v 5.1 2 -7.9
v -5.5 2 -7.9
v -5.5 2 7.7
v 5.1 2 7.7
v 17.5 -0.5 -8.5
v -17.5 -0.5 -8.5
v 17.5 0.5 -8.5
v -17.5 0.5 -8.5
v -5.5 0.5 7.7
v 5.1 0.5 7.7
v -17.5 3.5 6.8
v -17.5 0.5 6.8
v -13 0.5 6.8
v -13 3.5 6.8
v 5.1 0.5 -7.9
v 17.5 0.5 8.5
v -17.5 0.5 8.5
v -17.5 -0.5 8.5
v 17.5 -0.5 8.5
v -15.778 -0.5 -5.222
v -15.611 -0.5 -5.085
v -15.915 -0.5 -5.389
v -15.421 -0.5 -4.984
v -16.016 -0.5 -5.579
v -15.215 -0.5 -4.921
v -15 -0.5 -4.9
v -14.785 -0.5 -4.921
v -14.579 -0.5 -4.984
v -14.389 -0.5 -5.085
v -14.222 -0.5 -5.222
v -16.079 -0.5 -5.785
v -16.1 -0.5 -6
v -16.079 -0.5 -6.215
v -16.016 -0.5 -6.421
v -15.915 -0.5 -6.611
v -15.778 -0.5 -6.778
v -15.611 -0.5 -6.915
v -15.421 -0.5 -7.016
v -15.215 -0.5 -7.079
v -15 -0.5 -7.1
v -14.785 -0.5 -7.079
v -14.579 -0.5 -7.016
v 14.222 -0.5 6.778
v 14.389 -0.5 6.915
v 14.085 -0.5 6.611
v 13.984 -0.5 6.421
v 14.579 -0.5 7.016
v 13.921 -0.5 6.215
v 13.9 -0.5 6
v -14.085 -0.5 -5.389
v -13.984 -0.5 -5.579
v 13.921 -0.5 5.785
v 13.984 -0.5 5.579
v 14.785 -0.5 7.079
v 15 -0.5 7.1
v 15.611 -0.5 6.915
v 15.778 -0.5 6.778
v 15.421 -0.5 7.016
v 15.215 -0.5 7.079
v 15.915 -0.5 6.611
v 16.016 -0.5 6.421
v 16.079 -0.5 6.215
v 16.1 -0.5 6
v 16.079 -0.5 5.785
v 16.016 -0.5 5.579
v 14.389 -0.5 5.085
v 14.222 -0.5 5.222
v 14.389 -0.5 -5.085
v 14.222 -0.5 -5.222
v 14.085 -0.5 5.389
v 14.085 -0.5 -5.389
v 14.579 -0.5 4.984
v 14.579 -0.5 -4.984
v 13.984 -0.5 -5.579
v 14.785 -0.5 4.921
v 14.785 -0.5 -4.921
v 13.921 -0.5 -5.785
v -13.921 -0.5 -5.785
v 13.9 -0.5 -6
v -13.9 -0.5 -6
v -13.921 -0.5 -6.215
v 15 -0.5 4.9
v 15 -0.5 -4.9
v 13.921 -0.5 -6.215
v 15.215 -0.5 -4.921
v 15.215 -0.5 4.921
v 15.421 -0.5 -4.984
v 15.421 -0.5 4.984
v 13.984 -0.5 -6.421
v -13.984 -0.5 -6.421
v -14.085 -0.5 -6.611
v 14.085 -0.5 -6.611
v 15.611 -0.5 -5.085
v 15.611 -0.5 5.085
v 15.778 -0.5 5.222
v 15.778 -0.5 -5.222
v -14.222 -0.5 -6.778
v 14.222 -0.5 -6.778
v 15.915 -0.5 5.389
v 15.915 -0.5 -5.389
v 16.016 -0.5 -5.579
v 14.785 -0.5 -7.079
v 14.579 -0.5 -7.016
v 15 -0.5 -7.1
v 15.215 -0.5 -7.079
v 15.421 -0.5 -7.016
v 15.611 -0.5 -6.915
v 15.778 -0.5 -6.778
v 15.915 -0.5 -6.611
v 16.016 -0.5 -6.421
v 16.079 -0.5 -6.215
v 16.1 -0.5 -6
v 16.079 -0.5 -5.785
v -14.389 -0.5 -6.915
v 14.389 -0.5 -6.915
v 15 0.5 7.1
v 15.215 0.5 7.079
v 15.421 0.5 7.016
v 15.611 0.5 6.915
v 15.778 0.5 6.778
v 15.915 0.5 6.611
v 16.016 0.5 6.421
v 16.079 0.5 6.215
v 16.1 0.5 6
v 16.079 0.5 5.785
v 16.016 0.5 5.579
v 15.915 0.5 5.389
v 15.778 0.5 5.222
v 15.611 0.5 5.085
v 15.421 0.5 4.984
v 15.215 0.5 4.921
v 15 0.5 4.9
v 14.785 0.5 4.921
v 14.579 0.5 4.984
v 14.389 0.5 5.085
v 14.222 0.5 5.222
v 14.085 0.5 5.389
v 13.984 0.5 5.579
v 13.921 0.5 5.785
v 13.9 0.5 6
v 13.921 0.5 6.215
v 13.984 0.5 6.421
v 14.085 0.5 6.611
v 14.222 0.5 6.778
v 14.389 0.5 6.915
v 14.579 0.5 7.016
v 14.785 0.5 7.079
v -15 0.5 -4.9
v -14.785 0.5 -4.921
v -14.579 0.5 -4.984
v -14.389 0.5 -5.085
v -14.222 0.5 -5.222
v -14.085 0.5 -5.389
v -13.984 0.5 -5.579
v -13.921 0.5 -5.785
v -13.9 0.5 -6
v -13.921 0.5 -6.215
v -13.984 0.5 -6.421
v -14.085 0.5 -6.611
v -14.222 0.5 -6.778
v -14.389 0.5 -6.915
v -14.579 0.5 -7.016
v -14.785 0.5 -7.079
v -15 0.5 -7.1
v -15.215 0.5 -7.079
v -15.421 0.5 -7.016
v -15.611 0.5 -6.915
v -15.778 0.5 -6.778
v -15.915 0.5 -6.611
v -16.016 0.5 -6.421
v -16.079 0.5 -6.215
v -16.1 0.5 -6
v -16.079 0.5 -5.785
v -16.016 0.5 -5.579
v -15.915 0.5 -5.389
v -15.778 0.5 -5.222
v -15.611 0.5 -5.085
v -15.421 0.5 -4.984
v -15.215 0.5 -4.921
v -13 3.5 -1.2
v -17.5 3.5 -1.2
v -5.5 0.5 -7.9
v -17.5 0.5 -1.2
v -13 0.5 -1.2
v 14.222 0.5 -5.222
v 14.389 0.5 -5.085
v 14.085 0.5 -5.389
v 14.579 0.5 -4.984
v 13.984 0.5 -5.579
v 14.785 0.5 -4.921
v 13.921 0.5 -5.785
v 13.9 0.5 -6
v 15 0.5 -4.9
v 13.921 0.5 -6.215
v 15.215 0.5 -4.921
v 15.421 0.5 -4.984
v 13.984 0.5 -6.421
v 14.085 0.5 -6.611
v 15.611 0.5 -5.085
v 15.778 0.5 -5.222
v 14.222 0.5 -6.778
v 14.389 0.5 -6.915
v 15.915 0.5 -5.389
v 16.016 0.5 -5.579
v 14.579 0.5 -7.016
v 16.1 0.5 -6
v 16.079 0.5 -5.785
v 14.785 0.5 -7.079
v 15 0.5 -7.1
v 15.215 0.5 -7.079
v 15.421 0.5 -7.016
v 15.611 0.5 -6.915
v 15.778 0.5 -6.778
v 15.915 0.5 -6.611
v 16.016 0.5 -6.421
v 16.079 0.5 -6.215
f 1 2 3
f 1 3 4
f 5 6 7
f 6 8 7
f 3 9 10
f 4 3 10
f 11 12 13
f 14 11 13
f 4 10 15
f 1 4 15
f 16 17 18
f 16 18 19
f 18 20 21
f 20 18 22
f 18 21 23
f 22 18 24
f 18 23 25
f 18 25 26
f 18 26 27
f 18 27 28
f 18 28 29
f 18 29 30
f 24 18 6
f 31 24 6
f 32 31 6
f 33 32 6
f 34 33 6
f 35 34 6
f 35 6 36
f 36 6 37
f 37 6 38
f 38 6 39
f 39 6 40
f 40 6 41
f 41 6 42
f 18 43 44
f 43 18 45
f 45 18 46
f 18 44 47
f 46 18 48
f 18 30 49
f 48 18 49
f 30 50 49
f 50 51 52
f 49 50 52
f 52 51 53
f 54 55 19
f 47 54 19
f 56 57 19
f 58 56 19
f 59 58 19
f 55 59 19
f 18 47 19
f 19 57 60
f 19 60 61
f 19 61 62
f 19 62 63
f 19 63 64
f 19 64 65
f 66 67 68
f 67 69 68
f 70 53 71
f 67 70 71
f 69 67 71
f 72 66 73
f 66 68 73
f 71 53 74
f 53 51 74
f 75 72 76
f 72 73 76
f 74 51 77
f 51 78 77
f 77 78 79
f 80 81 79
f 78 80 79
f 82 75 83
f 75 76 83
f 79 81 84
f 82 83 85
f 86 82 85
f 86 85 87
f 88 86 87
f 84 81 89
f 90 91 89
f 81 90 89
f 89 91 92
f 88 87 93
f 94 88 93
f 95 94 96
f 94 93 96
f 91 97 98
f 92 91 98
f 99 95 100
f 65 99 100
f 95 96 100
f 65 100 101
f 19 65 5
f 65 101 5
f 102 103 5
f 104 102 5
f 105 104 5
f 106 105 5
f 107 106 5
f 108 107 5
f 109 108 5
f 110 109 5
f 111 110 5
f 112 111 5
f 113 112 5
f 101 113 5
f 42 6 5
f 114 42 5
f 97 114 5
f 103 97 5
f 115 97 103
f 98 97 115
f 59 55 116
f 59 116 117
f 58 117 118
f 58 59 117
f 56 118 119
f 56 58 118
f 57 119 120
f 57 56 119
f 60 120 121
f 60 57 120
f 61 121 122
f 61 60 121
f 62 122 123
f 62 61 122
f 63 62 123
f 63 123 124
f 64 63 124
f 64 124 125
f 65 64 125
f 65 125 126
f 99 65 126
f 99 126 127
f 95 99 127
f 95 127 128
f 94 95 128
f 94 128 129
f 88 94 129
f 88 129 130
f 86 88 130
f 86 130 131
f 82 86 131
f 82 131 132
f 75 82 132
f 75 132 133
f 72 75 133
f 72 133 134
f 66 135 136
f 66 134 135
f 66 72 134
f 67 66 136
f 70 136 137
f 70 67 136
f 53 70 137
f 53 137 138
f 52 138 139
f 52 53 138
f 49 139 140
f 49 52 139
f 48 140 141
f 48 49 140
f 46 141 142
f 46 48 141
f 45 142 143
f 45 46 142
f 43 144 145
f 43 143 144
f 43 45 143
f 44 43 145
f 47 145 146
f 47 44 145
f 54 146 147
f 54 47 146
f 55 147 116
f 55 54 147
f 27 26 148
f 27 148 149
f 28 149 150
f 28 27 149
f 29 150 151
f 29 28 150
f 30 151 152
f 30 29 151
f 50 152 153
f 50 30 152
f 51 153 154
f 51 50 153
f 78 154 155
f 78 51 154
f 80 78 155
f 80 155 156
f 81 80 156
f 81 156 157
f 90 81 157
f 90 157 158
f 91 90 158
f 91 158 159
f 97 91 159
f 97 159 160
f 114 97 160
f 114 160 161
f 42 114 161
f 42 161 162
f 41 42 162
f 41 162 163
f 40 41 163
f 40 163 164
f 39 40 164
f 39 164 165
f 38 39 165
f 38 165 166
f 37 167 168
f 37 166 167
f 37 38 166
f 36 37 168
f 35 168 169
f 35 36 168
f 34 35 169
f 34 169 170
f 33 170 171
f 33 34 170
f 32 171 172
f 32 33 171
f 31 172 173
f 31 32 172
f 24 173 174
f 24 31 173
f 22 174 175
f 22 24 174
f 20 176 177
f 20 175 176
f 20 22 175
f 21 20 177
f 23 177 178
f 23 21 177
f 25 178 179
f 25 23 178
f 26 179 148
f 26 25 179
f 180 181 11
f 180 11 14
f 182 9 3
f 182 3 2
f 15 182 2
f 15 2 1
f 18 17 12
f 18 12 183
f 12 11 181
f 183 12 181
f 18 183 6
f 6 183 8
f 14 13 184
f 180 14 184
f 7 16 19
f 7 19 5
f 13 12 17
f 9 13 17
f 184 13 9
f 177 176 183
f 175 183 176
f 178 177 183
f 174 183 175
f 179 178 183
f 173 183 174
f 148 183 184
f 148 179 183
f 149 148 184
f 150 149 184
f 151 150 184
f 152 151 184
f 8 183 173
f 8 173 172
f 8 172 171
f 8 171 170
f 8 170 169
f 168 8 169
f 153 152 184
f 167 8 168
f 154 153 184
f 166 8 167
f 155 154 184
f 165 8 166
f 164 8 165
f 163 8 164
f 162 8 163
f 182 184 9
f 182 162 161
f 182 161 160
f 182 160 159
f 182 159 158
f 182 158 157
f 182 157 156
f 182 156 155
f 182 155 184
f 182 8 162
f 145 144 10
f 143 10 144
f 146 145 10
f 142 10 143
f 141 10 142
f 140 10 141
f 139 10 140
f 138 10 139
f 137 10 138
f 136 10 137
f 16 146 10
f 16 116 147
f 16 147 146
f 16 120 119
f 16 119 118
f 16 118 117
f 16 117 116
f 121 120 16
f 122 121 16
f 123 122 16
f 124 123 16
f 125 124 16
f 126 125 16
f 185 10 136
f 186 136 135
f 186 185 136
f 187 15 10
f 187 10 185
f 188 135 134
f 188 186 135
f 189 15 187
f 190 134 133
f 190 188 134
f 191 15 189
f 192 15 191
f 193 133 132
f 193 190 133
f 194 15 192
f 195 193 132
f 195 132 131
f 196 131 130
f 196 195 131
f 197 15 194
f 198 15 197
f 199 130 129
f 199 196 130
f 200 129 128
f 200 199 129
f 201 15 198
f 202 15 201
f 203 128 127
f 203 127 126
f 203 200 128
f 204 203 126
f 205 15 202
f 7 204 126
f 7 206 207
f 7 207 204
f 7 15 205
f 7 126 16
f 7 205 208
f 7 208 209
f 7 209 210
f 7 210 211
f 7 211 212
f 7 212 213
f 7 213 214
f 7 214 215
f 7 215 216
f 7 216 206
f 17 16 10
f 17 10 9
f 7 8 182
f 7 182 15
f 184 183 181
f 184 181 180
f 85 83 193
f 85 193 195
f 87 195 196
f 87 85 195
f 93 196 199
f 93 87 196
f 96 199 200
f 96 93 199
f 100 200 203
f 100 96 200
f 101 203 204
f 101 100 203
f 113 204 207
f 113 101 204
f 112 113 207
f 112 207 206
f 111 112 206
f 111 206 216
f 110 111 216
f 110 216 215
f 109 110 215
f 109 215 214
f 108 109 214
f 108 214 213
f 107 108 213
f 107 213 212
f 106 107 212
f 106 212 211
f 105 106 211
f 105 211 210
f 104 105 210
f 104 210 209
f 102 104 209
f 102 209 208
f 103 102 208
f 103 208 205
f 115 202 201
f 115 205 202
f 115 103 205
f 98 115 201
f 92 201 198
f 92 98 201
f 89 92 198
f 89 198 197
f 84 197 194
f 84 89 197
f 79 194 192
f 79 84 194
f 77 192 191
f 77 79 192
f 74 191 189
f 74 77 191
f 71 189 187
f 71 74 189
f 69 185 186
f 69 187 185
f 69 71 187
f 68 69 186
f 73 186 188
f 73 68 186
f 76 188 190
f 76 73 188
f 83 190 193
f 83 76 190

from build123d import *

# Parameters (mm, degrees)
SKETCH1_W               = 35
SKETCH1_H               = 17
BOSS_EXTRUDE1_DEPTH     = 0.5
SKETCH2_W               = 4.5
SKETCH2_H               = 8
BOSS_EXTRUDE2_DEPTH     = 3
SKETCH3_W               = 10.6
SKETCH3_H               = 15.6
BOSS_EXTRUDE3_DEPTH     = 1.5
CUT_EXTRUDE1_DEPTH      = 20.685019685
CUT_EXTRUDE1_DEPTH_BACK = 20.685019685
SKETCH4_R               = 1.1


with BuildPart() as part:
    # Sketch1 → Boss-Extrude1 (new, symmetric)
    with BuildSketch(Plane(origin=(0, 0, 0), x_dir=(1, 0, 0), z_dir=(0, 1, 0))):
        Rectangle(SKETCH1_W, SKETCH1_H)
    extrude(amount=BOSS_EXTRUDE1_DEPTH, both=True)

    # Sketch2 → Boss-Extrude2 (add)
    with BuildSketch(Plane(origin=(0, 0.5, 0), x_dir=(1, 0, 0), z_dir=(0, 1, 0))):
        with Locations((-15.25, -2.8)):
            Rectangle(SKETCH2_W, SKETCH2_H)
    extrude(amount=BOSS_EXTRUDE2_DEPTH)

    # Sketch3 → Boss-Extrude3 (add)
    with BuildSketch(Plane(origin=(0, 0.5, 0), x_dir=(1, 0, 0), z_dir=(0, 1, 0))):
        with Locations((-0.2, 0.1)):
            Rectangle(SKETCH3_W, SKETCH3_H)
    extrude(amount=BOSS_EXTRUDE3_DEPTH)

    # Sketch4 → Cut-Extrude1 (cut, two sides: drawn at the far end of the back side and taken through both)
    with BuildSketch(Plane(origin=(0, 0.5, 0), x_dir=(1, 0, 0), z_dir=(0, 1, 0)).offset(-CUT_EXTRUDE1_DEPTH_BACK)):
        with Locations(Location((15, 6, 0), (0, 0, 270))):
            Circle(SKETCH4_R)
        with Locations(Location((15, -6, 0), (0, 0, 270))):
            Circle(SKETCH4_R)
        with Locations(Location((-15, 6, 0), (0, 0, 270))):
            Circle(SKETCH4_R)
    extrude(amount=CUT_EXTRUDE1_DEPTH + CUT_EXTRUDE1_DEPTH_BACK, mode=Mode.SUBTRACT)


solid = part.part
